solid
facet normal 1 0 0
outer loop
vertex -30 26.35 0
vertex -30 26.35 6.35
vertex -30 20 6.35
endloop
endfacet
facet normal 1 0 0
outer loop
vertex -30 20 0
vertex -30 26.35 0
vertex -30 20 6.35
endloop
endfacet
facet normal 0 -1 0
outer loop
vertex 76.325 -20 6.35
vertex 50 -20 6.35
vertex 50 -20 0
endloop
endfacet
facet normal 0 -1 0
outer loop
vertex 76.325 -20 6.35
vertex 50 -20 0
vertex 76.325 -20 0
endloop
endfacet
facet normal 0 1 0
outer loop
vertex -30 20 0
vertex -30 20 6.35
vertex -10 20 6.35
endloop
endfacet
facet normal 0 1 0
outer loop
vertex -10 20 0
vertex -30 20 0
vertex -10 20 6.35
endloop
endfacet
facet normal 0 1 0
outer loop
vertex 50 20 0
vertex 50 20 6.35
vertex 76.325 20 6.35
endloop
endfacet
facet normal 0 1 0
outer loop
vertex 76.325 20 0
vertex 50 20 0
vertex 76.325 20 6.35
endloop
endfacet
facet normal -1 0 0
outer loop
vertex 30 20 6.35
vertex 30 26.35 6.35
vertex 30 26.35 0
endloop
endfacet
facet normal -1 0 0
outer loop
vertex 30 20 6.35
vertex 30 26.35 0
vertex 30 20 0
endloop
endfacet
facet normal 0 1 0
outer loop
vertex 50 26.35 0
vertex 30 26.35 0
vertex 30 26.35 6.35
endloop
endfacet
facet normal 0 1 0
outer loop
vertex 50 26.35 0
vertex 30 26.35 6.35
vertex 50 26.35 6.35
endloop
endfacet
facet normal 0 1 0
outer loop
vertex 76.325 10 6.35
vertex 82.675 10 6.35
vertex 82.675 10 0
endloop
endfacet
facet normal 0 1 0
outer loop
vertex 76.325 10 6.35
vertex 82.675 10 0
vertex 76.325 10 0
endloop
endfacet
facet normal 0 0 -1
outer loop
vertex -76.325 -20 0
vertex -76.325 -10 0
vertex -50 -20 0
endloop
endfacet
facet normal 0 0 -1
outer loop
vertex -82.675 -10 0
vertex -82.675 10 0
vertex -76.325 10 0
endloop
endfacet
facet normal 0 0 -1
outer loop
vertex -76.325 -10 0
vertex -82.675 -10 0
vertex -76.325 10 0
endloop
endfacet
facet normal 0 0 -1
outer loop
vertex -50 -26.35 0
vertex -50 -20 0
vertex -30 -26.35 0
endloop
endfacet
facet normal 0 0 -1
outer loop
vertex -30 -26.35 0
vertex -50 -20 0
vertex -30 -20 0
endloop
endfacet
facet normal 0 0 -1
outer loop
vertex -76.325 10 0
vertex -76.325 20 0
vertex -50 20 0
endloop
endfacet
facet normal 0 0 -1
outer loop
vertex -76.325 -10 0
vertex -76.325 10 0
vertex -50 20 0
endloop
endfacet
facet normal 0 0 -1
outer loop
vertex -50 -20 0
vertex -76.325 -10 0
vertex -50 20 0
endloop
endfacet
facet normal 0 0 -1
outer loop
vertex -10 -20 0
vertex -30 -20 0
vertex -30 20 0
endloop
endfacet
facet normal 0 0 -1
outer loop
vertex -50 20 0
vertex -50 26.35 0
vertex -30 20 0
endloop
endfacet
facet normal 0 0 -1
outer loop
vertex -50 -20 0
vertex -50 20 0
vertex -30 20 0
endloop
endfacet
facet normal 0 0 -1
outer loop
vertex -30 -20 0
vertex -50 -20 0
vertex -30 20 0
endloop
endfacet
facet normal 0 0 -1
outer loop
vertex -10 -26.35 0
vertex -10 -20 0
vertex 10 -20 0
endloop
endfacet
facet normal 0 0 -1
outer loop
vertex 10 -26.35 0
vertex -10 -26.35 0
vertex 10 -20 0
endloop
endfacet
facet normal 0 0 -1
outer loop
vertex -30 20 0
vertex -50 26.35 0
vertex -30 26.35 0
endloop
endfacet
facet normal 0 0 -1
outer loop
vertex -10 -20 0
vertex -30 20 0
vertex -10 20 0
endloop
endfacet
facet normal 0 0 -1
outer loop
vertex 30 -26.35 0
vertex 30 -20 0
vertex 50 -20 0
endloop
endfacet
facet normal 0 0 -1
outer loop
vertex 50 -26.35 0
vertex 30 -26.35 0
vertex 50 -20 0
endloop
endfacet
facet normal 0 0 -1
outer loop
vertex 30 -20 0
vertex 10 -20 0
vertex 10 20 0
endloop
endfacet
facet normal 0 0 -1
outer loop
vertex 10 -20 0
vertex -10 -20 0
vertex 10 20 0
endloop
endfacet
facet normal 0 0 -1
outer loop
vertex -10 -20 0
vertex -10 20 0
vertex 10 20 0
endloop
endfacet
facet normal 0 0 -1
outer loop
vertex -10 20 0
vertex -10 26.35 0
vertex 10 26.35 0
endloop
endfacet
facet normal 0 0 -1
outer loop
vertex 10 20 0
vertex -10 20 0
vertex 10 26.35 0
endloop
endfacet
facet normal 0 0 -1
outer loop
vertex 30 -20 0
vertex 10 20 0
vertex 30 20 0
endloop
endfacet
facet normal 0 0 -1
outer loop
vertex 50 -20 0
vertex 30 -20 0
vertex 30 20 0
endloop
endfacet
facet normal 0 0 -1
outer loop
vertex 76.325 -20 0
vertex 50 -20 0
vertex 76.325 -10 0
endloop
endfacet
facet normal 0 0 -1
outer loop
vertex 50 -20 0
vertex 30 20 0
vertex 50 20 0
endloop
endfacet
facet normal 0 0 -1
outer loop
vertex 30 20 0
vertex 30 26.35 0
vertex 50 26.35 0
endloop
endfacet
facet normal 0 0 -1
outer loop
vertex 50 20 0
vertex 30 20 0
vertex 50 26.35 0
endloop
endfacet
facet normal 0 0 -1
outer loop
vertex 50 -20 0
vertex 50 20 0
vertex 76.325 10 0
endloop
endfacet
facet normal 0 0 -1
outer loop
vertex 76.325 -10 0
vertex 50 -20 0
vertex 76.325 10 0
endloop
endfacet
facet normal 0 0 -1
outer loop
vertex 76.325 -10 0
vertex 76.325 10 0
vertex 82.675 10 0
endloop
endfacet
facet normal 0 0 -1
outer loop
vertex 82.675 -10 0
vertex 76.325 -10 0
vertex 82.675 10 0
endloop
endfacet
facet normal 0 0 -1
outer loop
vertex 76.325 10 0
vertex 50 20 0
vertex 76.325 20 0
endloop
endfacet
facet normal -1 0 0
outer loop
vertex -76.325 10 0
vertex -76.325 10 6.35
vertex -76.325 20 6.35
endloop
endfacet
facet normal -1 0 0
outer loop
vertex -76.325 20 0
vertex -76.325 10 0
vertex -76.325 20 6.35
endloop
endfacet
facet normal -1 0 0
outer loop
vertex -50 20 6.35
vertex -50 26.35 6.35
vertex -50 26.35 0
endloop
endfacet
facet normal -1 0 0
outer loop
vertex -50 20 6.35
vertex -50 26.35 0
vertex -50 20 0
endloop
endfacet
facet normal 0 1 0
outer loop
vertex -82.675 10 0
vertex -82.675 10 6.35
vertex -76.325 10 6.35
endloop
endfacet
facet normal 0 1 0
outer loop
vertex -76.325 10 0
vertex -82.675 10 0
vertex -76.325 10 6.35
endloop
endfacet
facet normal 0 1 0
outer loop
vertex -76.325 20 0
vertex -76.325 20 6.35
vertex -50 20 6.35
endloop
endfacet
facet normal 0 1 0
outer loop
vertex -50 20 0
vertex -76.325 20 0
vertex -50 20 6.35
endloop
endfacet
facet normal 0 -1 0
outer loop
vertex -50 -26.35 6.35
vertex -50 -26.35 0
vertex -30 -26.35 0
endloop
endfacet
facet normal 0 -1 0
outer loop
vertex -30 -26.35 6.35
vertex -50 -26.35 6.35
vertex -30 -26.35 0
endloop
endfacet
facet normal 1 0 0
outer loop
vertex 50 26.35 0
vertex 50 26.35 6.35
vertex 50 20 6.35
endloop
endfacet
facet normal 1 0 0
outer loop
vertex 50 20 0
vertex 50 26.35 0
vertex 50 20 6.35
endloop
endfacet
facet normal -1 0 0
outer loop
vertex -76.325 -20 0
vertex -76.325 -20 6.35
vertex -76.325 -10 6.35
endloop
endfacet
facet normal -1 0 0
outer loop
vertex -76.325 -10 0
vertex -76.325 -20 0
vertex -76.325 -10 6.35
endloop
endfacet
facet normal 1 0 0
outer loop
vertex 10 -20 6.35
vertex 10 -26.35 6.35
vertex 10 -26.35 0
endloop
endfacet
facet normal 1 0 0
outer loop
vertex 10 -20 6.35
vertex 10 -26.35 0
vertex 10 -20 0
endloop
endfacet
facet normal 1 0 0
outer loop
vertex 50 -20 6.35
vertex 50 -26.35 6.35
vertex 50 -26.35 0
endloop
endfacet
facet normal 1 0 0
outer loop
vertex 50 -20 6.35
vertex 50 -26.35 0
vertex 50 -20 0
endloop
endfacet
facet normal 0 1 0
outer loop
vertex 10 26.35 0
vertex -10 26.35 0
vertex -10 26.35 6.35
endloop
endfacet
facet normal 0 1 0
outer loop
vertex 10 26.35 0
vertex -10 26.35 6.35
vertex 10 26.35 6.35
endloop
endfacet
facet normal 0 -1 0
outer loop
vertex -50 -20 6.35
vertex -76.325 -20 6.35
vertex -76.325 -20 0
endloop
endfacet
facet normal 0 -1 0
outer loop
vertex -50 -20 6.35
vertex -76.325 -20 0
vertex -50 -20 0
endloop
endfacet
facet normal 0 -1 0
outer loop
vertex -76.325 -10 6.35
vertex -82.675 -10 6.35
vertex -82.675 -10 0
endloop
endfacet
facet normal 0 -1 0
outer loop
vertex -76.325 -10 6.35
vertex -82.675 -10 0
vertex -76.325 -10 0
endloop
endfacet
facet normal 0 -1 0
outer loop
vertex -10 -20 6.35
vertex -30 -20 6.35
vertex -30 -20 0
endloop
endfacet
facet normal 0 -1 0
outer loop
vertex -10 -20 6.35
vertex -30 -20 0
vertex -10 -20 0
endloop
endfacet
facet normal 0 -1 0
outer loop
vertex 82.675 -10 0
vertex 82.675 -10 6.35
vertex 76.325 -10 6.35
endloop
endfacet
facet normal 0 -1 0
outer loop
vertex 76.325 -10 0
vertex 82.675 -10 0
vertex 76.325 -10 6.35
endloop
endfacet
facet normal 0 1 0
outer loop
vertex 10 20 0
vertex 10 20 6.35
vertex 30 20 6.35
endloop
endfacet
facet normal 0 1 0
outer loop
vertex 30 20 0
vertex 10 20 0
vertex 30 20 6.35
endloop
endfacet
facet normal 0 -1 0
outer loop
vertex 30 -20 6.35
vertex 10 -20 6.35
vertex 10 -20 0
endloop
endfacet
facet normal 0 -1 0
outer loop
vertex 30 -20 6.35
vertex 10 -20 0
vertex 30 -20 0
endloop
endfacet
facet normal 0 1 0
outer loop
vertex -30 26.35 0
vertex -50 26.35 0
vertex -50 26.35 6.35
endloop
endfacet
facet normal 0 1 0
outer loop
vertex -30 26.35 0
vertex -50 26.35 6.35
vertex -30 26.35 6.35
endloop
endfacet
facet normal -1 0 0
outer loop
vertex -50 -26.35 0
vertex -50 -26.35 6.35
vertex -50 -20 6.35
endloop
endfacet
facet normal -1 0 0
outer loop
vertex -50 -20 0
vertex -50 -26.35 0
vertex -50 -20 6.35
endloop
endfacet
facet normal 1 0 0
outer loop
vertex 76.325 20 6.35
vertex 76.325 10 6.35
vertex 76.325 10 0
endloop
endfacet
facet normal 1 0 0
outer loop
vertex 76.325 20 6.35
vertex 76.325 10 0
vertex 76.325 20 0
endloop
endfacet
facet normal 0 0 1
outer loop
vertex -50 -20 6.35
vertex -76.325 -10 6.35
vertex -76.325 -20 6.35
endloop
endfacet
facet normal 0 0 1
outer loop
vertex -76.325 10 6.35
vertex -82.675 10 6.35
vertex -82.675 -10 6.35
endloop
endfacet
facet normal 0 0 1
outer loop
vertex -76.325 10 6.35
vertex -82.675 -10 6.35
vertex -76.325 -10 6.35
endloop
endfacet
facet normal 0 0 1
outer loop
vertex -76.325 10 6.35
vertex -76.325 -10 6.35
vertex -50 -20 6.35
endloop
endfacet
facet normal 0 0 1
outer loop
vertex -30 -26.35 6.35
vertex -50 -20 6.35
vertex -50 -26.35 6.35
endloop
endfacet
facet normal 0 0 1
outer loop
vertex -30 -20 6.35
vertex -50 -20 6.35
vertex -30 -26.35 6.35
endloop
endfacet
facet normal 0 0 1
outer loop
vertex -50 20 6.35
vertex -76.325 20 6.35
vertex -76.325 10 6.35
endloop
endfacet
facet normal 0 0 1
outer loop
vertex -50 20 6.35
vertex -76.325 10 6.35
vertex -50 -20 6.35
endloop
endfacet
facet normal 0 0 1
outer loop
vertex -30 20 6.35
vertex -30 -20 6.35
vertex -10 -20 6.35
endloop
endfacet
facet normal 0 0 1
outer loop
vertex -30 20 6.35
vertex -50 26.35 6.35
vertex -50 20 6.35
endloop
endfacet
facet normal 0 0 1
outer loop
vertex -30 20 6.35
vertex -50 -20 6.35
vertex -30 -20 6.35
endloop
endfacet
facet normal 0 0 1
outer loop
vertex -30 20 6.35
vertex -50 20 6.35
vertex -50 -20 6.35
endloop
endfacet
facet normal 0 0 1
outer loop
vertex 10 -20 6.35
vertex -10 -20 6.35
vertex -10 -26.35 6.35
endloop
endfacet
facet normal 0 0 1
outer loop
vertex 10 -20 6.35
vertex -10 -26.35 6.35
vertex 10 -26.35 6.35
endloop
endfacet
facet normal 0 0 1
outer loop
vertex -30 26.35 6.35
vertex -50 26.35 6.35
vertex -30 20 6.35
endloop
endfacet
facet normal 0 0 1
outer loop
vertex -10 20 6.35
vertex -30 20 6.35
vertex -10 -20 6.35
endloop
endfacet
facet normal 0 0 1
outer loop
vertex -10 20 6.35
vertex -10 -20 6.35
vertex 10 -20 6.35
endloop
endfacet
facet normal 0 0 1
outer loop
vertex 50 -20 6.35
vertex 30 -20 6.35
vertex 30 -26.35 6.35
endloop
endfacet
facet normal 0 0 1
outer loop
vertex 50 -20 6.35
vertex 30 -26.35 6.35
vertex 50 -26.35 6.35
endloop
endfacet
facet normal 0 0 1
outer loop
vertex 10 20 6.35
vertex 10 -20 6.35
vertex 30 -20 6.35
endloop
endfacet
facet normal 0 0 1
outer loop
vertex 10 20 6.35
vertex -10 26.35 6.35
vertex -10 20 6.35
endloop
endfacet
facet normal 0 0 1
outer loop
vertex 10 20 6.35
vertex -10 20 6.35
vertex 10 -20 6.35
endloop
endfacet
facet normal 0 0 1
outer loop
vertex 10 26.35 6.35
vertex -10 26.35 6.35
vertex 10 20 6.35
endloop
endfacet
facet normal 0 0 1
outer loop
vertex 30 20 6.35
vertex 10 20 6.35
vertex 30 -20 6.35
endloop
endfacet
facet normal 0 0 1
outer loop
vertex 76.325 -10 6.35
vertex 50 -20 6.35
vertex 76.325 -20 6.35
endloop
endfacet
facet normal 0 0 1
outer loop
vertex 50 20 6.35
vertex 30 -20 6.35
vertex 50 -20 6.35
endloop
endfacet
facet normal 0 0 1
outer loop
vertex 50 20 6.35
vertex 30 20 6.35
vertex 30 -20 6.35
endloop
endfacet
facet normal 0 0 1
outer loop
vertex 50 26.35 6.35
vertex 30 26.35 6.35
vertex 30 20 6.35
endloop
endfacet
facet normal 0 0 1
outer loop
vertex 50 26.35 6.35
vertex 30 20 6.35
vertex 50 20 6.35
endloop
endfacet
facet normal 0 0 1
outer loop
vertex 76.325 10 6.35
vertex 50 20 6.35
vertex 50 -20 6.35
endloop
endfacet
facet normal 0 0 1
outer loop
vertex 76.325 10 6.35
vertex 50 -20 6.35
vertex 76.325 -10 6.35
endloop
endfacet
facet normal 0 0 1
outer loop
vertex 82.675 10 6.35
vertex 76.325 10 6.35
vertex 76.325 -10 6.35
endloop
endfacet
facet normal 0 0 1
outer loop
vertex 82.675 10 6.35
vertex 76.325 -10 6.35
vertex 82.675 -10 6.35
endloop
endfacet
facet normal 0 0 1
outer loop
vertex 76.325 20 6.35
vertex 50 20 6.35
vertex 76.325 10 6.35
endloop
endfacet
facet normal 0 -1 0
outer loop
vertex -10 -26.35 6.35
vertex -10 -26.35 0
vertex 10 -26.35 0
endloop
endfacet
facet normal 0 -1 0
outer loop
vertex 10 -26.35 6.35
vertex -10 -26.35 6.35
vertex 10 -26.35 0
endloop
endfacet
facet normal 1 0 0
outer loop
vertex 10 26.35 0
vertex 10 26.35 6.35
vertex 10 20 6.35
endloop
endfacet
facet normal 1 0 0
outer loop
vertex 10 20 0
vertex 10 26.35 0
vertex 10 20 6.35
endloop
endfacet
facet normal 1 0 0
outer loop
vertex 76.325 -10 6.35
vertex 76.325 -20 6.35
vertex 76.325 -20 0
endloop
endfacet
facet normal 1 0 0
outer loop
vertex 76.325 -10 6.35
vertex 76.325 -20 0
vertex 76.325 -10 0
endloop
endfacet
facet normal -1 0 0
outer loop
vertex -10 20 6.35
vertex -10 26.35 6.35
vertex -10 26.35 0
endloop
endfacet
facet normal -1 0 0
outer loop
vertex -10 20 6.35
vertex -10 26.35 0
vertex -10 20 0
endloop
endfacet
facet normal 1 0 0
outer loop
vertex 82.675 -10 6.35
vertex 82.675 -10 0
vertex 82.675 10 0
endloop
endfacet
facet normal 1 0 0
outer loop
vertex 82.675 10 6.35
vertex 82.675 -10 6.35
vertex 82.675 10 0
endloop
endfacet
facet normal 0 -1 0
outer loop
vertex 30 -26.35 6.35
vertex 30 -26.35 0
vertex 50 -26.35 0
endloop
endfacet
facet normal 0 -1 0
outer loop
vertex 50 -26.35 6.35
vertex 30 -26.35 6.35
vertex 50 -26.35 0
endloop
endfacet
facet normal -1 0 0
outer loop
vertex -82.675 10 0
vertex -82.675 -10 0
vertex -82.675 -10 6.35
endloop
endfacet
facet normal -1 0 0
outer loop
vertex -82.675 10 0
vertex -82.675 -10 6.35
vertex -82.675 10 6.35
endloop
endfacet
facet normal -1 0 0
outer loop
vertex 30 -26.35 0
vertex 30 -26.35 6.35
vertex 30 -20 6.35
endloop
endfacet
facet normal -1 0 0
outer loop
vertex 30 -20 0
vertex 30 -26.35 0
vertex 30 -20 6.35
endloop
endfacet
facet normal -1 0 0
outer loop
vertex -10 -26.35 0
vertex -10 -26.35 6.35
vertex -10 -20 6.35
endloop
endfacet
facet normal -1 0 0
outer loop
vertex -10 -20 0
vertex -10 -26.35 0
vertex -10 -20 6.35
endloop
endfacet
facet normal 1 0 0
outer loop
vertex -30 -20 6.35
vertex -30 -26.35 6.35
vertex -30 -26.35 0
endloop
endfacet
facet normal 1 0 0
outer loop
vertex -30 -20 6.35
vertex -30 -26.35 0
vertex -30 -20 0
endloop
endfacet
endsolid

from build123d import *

# Parameters (mm, degrees)
ESQUISSE1_W             = 165.35
ESQUISSE1_H             = 52.7
BOSS_EXTRU_1_DEPTH      = 6.35
ESQUISSE3_W             = 6.35
ESQUISSE3_H             = 16.35
ENL_V_MAT_EXTRU_1_DEPTH = 88.004601171
ESQUISSE5_W             = 20
ESQUISSE5_H             = 6.35
ESQUISSE5_W_2           = 26.325
ENL_V_MAT_EXTRU_2_DEPTH = 88.004601171


with BuildPart() as part:
    # Esquisse1 → Boss.-Extru.1 (new body)
    with BuildSketch(Plane.XY):
        Rectangle(ESQUISSE1_W, ESQUISSE1_H)
    extrude(amount=BOSS_EXTRU_1_DEPTH)

    # Esquisse3 → Enlèv. mat.-Extru.1 (cut, through all)
    with BuildSketch(Plane.XY.offset(6.35)):
        with Locations((-79.5, -18.175)):
            Rectangle(ESQUISSE3_W, ESQUISSE3_H)
        with Locations((-79.5, 18.175)):
            Rectangle(ESQUISSE3_W, ESQUISSE3_H)
    enl_v_mat_extru_1 = extrude(amount=-ENL_V_MAT_EXTRU_1_DEPTH, mode=Mode.SUBTRACT)

    # Symétrie1: Enlèv. mat.-Extru.1 across plane
    add(enl_v_mat_extru_1.mirror(Plane(origin=(0, 0, 0), x_dir=(0, 0, 1), z_dir=(1, 0, 0))), mode=Mode.SUBTRACT)

    # Esquisse5 → Enlèv. mat.-Extru.2 (cut, through all)
    with BuildSketch(Plane.XY.offset(6.35)):
        with Locations((-20, -23.175)):
            Rectangle(ESQUISSE5_W, ESQUISSE5_H)
        with Locations((20, -23.175)):
            Rectangle(ESQUISSE5_W, ESQUISSE5_H)
        with Locations((63.1625, -23.175)):
            Rectangle(ESQUISSE5_W_2, ESQUISSE5_H)
        with Locations((-63.1625, -23.175)):
            Rectangle(ESQUISSE5_W_2, ESQUISSE5_H)
    enl_v_mat_extru_2 = extrude(amount=-ENL_V_MAT_EXTRU_2_DEPTH, mode=Mode.SUBTRACT)

    # Symétrie2: Enlèv. mat.-Extru.2 across plane
    add(enl_v_mat_extru_2.mirror(Plane.ZX), mode=Mode.SUBTRACT)


solid = part.part
